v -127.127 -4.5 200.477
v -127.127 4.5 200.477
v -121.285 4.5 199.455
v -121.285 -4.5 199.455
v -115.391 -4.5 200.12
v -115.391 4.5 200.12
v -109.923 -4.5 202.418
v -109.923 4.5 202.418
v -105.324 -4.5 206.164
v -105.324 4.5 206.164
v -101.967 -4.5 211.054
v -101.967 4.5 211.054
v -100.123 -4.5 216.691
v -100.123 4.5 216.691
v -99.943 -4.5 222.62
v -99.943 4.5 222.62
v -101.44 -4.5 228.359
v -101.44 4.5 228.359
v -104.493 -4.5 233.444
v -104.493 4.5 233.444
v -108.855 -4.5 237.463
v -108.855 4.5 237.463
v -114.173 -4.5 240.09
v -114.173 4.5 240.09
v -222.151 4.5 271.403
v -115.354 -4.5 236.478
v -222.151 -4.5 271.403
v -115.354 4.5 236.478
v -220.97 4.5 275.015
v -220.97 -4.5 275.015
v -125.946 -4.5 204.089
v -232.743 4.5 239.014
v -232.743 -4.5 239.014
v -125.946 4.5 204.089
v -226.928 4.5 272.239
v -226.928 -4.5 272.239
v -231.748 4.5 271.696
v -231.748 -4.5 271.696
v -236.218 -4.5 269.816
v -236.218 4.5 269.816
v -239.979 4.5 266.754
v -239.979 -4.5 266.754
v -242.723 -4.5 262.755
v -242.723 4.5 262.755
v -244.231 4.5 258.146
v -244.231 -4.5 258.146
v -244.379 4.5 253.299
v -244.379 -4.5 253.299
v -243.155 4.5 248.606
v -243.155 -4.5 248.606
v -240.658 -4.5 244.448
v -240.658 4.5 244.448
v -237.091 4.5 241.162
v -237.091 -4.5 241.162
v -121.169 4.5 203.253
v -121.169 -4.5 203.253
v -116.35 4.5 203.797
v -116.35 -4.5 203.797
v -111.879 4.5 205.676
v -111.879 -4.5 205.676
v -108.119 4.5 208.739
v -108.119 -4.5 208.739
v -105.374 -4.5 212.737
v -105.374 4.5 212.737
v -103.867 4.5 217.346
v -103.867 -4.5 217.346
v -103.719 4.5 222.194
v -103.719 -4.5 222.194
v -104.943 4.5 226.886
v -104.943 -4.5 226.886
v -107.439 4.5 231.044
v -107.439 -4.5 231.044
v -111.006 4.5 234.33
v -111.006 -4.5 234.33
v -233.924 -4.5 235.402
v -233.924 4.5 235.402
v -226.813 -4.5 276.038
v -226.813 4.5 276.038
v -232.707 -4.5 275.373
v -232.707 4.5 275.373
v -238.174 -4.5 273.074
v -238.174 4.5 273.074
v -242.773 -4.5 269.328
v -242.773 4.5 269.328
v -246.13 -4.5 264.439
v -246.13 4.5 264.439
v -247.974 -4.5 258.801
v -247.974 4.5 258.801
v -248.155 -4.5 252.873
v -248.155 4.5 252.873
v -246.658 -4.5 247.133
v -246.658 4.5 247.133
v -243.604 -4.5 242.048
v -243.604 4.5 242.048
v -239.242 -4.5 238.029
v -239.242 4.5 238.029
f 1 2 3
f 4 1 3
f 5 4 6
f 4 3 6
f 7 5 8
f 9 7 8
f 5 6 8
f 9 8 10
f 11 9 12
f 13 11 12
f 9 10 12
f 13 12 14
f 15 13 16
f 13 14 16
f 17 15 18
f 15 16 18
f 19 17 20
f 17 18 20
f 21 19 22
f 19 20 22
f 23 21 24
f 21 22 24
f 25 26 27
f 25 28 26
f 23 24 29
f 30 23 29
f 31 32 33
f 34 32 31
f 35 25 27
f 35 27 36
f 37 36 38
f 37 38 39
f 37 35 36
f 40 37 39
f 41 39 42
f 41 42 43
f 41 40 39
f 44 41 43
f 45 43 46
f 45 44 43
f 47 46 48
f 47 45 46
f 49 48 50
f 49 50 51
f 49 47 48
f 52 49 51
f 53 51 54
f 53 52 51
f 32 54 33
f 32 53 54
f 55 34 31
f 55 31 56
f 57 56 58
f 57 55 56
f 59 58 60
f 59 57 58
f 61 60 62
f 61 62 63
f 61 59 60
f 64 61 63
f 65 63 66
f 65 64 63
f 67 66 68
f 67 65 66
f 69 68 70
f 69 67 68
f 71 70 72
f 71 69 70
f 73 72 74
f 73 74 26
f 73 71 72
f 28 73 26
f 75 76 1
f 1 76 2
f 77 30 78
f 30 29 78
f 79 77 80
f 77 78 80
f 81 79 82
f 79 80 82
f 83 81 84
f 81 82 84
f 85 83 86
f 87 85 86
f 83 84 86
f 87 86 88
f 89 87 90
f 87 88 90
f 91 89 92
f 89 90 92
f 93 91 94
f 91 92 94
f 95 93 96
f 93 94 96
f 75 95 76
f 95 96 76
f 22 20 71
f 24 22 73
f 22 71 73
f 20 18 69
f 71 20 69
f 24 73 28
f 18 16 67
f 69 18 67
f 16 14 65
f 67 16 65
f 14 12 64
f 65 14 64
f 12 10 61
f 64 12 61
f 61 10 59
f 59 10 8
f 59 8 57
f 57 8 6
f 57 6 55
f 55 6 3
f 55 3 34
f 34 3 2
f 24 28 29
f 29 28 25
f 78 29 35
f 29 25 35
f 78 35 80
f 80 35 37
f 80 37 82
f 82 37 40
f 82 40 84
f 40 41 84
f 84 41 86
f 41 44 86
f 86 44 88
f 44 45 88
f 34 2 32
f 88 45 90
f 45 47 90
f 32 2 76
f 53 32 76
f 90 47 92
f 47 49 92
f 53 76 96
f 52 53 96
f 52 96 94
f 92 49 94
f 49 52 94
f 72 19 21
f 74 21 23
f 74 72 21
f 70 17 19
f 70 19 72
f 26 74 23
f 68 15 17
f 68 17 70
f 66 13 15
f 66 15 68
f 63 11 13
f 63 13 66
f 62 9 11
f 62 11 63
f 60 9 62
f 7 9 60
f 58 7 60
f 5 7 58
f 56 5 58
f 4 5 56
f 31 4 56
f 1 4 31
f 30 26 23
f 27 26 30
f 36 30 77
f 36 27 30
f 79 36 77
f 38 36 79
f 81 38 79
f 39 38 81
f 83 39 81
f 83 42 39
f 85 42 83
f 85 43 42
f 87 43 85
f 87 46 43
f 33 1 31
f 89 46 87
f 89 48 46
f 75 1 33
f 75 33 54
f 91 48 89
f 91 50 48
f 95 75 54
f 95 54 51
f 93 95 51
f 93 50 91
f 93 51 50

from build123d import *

# Parameters (mm, degrees)
CROQUIS42_R                        = 14.2875
CROQUIS42_R_2                      = 2.4892
CROQUIS42_R_3                      = 9.5631
EXTRUDE_4400_23_P_0501_DEPTH       = 6.35
EXTRUDE_4400_23_P_0502_OUTLINE_R   = 14.2875
EXTRUDE_4400_23_P_0502_OUTLINE_R_2 = 2.4892
EXTRUDE_4400_23_P_0502_DEPTH       = 6.35
CROQUIS47_R                        = 2.4892
CORTAR_EXTRUIR1_DEPTH              = 392.719699627
CROQUIS48_W                        = 203.2
CROQUIS48_H                        = 25.4
SALIENTE_EXTRUIR4_DEPTH            = 25.4
VACIADO1_T                         = -3.175
CROQUIS49_W                        = 50.8
CROQUIS49_H                        = 25.4
SALIENTE_EXTRUIR5_DEPTH            = 152.4
VACIADO2_T                         = -3.175
CROQUIS50_R                        = 14.3129
CROQUIS50_R_2                      = 2.4892
CORTAR_EXTRUIR2_DEPTH              = 539.610187059
CROQUIS53_R                        = 2.4892
SALIENTE_EXTRUIR6_DEPTH            = 3.175
CROQUIS55_R                        = 2.4892
CORTAR_EXTRUIR3_DEPTH              = 28.575
CORTAR_EXTRUIR4_DEPTH              = 420.505185398
CORTAR_EXTRUIR4_DEPTH_BACK         = 420.505185398
CROQUIS56_R                        = 3.2639
CROQUIS57_W                        = 50.8762
CROQUIS57_H                        = 25.4762
CORTAR_EXTRUIR5_DEPTH              = 6.35
SALIENTE_EXTRUIR7_DEPTH            = 4.5
SALIENTE_EXTRUIR9_DEPTH            = 4.5


# Read off the part's stored shape, not the designer's step: 4400-23-P-0502
with BuildPart() as part:
    # Croquis42 → 4400-23-P-0501 (new body)
    with BuildSketch(Plane(origin=(0, 184.15, 0), x_dir=(1, 0, 0), z_dir=(0, 1, 0))):
        with BuildLine():
            Line((88.359188985, 137.182253519), (-88.34651861, 137.182253519))
            ThreePointArc((-88.34651861, 137.182253519), (-105.337250829, 130.662799557), (-113.605912458, 114.451152627))
            Line((-113.605912458, 114.451152627), (-139.101589768, -126.848847373))
            ThreePointArc((-139.101589768, -126.848847373), (-140.353519458, -135.509571637), (-142.264354165, -144.049137401))
            ThreePointArc((-142.264354165, -144.049137401), (-151.832193089, -152.899040942), (-164.816388377, -151.769878826))
            ThreePointArc((-164.816388377, -151.769878826), (-169.567285608, -151.859959078), (-171.875550605, -156.013397612))
            ThreePointArc((-171.875550605, -156.013397612), (-178.08501659, -181.1261948), (-195.856181675, -199.925017686))
            ThreePointArc((-195.856181675, -199.925017686), (-196.402455792, -200.320741342), (-196.887342109, -200.789674047))
            Line((-196.887342109, -200.789674047), (-212.697786669, -218.412409382))
            ThreePointArc((-212.697786669, -218.412409382), (-217.730973382, -222.727024179), (-223.709210874, -225.59225468))
            Line((-223.709210874, -225.59225468), (-235.835713977, -229.557877567))
            ThreePointArc((-235.835713977, -229.557877567), (-253.324996625, -262.868518564), (-220.522053125, -281.292435328))
            Line((-220.522053125, -281.292435328), (-112.095188672, -252.504801968))
            ThreePointArc((-112.095188672, -252.504801968), (-87.673300223, -225.175066373), (-103.110565757, -191.933015956))
            ThreePointArc((-103.110565757, -191.933015956), (-118.079867963, -174.552433995), (-120.357522092, -151.727514948))
            Line((-120.357522092, -151.727514948), (-112.383619234, -113.627514948))
            ThreePointArc((-112.383619234, -113.627514948), (-101.768716069, -96.213982816), (-82.55, -89.391356987))
            ThreePointArc((-82.55, -89.391356987), (-62.030318089, -81.335848201), (-52.471032559, -61.472096599))
            Line((-52.471032559, -61.472096599), (-47.621676919, 3.551545851))
            ThreePointArc((-47.621676919, 3.551545851), (0, 47.753927487), (47.621676919, 3.551545851))
            Line((47.621676919, 3.551545851), (52.471032559, -61.472096599))
            ThreePointArc((52.471032559, -61.472096599), (62.030318089, -81.335848201), (82.55, -89.391356987))
            ThreePointArc((82.55, -89.391356987), (101.768716069, -96.213982816), (112.383619234, -113.627514948))
            Line((112.383619234, -113.627514948), (120.357522092, -151.727514948))
            ThreePointArc((120.357522092, -151.727514948), (118.079867963, -174.552433995), (103.110565757, -191.933015956))
            ThreePointArc((103.110565757, -191.933015956), (87.673300223, -225.175066373), (112.095188672, -252.504801968))
            Line((112.095188672, -252.504801968), (220.522053125, -281.292435328))
            ThreePointArc((220.522053125, -281.292435328), (253.324996625, -262.868518564), (235.835713977, -229.557877567))
            Line((235.835713977, -229.557877567), (223.709210874, -225.59225468))
            ThreePointArc((223.709210874, -225.59225468), (217.730973382, -222.727024179), (212.697786669, -218.412409382))
            Line((212.697786669, -218.412409382), (196.887342109, -200.789674047))
            ThreePointArc((196.887342109, -200.789674047), (196.402455792, -200.320741342), (195.856181675, -199.925017686))
            ThreePointArc((195.856181675, -199.925017686), (178.08501659, -181.1261948), (171.875550605, -156.013397612))
            ThreePointArc((171.875550605, -156.013397612), (169.567285608, -151.859959078), (164.816388377, -151.769878826))
            ThreePointArc((164.816388377, -151.769878826), (152.26322842, -153.039859148), (142.647258285, -144.87115097))
            ThreePointArc((142.647258285, -144.87115097), (140.583371058, -135.914425081), (139.245830086, -126.820825503))
            Line((139.245830086, -126.820825503), (113.617107402, 114.465079877))
            ThreePointArc((113.617107402, 114.465079877), (105.344715331, 130.667483058), (88.359188985, 137.182253519))
        make_face()
        with Locations(Location((-227.447376581, -255.208627108, 0), (0, 0, 270))):
            Circle(CROQUIS42_R, mode=Mode.SUBTRACT)
        with Locations(Location((-193.342405236, -203.970055914, 0), (0, 0, 270))):
            Circle(CROQUIS42_R_2, mode=Mode.SUBTRACT)
        with Locations(Location((-120.65, -220.283627108, 0), (0, 0, 270))):
            Circle(CROQUIS42_R, mode=Mode.SUBTRACT)
        with Locations(Location((-167.113590003, -155.941721458, 0), (0, 0, 270))):
            Circle(CROQUIS42_R_2, mode=Mode.SUBTRACT)
        with Locations(Location((120.65, -220.283627108, 0), (0, 0, 270))):
            Circle(CROQUIS42_R, mode=Mode.SUBTRACT)
        with Locations(Location((227.447376581, -255.208627108, 0), (0, 0, 270))):
            Circle(CROQUIS42_R, mode=Mode.SUBTRACT)
        with Locations(Location((167.113590003, -155.941721458, 0), (0, 0, 270))):
            Circle(CROQUIS42_R_2, mode=Mode.SUBTRACT)
        with Locations(Location((-82.55, -59.228856987, 0), (0, 0, 270))):
            Circle(CROQUIS42_R, mode=Mode.SUBTRACT)
        with Locations(Location((-82.55, 29.266072697, 0), (0, 0, 270))):
            Circle(CROQUIS42_R_2, mode=Mode.SUBTRACT)
        with Locations(Location((-107.95, 54.666072697, 0), (0, 0, 270))):
            Circle(CROQUIS42_R_2, mode=Mode.SUBTRACT)
        with Locations(Location((-82.55, 54.666072697, 0), (0, 0, 270))):
            Circle(CROQUIS42_R_3, mode=Mode.SUBTRACT)
        with Locations(Location((-82.55, 80.066072697, 0), (0, 0, 270))):
            Circle(CROQUIS42_R_2, mode=Mode.SUBTRACT)
        with Locations(Location((-57.15, 54.666072697, 0), (0, 0, 270))):
            Circle(CROQUIS42_R_2, mode=Mode.SUBTRACT)
        with Locations(Location((82.55, -59.228856987, 0), (0, 0, 270))):
            Circle(CROQUIS42_R, mode=Mode.SUBTRACT)
        with Locations(Location((82.55, 29.266072697, 0), (0, 0, 270))):
            Circle(CROQUIS42_R_2, mode=Mode.SUBTRACT)
        with Locations(Location((57.15, 54.666072697, 0), (0, 0, 270))):
            Circle(CROQUIS42_R_2, mode=Mode.SUBTRACT)
        with Locations(Location((82.55, 54.666072697, 0), (0, 0, 270))):
            Circle(CROQUIS42_R_3, mode=Mode.SUBTRACT)
        with Locations(Location((107.95, 54.666072697, 0), (0, 0, 270))):
            Circle(CROQUIS42_R_2, mode=Mode.SUBTRACT)
        with Locations(Location((82.55, 80.066072697, 0), (0, 0, 270))):
            Circle(CROQUIS42_R_2, mode=Mode.SUBTRACT)
        with Locations(Location((193.342405236, -203.970055914, 0), (0, 0, 270))):
            Circle(CROQUIS42_R_2, mode=Mode.SUBTRACT)
    extrude(amount=EXTRUDE_4400_23_P_0501_DEPTH)


with BuildPart() as body_2:
    # 4400-23-P-0502 outline → 4400-23-P-0502 (new body)
    with BuildSketch(Plane(origin=(0, 95.25, 0), x_dir=(1, 0, 0), z_dir=(0, 1, 0))):
        with BuildLine():
            Line((-113.605912458, 114.451152627), (-139.101589768, -126.848847373))
            ThreePointArc((-139.101589768, -126.848847373), (-140.353519458, -135.509571637), (-142.264354165, -144.049137401))
            ThreePointArc((-142.264354165, -144.049137401), (-151.832193089, -152.899040942), (-164.816388377, -151.769878826))
            ThreePointArc((-164.816388377, -151.769878826), (-169.567285608, -151.859959078), (-171.875550605, -156.013397612))
            ThreePointArc((-171.875550605, -156.013397612), (-178.08501659, -181.1261948), (-195.856181675, -199.925017686))
            Line((-195.856181675, -199.925017686), (-212.697786669, -218.412409382))
            ThreePointArc((-212.697786669, -218.412409382), (-217.730973382, -222.727024179), (-223.709210874, -225.59225468))
            Line((-223.709210874, -225.59225468), (-235.835713977, -229.557877567))
            ThreePointArc((-235.835713977, -229.557877567), (-253.324996625, -262.868518564), (-220.522053125, -281.292435328))
            Line((-220.522053125, -281.292435328), (-112.095188672, -252.504801968))
            ThreePointArc((-112.095188672, -252.504801968), (-87.673300223, -225.175066373), (-103.110565757, -191.933015956))
            ThreePointArc((-103.110565757, -191.933015956), (-118.079867963, -174.552433995), (-120.357522092, -151.727514948))
            Line((-120.357522092, -151.727514948), (-112.383619234, -113.627514948))
            ThreePointArc((-112.383619234, -113.627514948), (-100.293200153, -90.736166152), (-77.899975527, -77.74634036))
            ThreePointArc((-77.899975527, -77.74634036), (-67.495099348, -70.970657719), (-63.457595278, -59.228856987))
            Line((-63.457595278, -59.228856987), (-63.457595278, 0))
            ThreePointArc((-63.457595278, 0), (0, 63.457595278), (63.457595278, 0))
            Line((63.457595278, 0), (63.457595278, -59.228856987))
            ThreePointArc((63.457595278, -59.228856987), (67.495099348, -70.970657719), (77.899975527, -77.74634036))
            ThreePointArc((77.899975527, -77.74634036), (100.293200153, -90.736166152), (112.383619234, -113.627514948))
            Line((112.383619234, -113.627514948), (120.357522092, -151.727514948))
            ThreePointArc((120.357522092, -151.727514948), (118.079867963, -174.552433995), (103.110565757, -191.933015956))
            ThreePointArc((103.110565757, -191.933015956), (87.673300223, -225.175066373), (112.095188672, -252.504801968))
            Line((112.095188672, -252.504801968), (220.522053125, -281.292435328))
            ThreePointArc((220.522053125, -281.292435328), (253.324996625, -262.868518564), (235.835713977, -229.557877567))
            Line((235.835713977, -229.557877567), (223.709210874, -225.59225468))
            ThreePointArc((223.709210874, -225.59225468), (217.730973382, -222.727024179), (212.697786669, -218.412409382))
            Line((212.697786669, -218.412409382), (195.856181675, -199.925017686))
            ThreePointArc((195.856181675, -199.925017686), (178.08501659, -181.1261948), (171.875550605, -156.013397612))
            ThreePointArc((171.875550605, -156.013397612), (169.567285608, -151.859959078), (164.816388377, -151.769878826))
            ThreePointArc((164.816388377, -151.769878826), (151.832193089, -152.899040942), (142.264354165, -144.049137401))
            ThreePointArc((142.264354165, -144.049137401), (140.353519458, -135.509571637), (139.101589768, -126.848847373))
            Line((139.101589768, -126.848847373), (113.605912458, 114.451152627))
            ThreePointArc((113.605912458, 114.451152627), (105.341959426, 130.658561195), (88.359188984, 137.182250359))
            Line((88.359188984, 137.182250359), (-88.34651861, 137.182253519))
            ThreePointArc((-88.34651861, 137.182253519), (-105.337250829, 130.662799557), (-113.605912458, 114.451152627))
        make_face()
        with Locations((-227.447376581, -255.208627108)):
            Circle(EXTRUDE_4400_23_P_0502_OUTLINE_R, mode=Mode.SUBTRACT)
        with Locations((-193.342405236, -203.970055914)):
            Circle(EXTRUDE_4400_23_P_0502_OUTLINE_R_2, mode=Mode.SUBTRACT)
        with Locations((-120.65, -220.283627108)):
            Circle(EXTRUDE_4400_23_P_0502_OUTLINE_R, mode=Mode.SUBTRACT)
        with Locations((-167.113590003, -155.941721458)):
            Circle(EXTRUDE_4400_23_P_0502_OUTLINE_R_2, mode=Mode.SUBTRACT)
        with Locations((120.65, -220.283627108)):
            Circle(EXTRUDE_4400_23_P_0502_OUTLINE_R, mode=Mode.SUBTRACT)
        with Locations((227.447376581, -255.208627108)):
            Circle(EXTRUDE_4400_23_P_0502_OUTLINE_R, mode=Mode.SUBTRACT)
        with Locations((193.342405236, -203.970055914)):
            Circle(EXTRUDE_4400_23_P_0502_OUTLINE_R_2, mode=Mode.SUBTRACT)
        with Locations((167.113590003, -155.941721458)):
            Circle(EXTRUDE_4400_23_P_0502_OUTLINE_R_2, mode=Mode.SUBTRACT)
        with Locations((-82.55, -59.228856987)):
            Circle(EXTRUDE_4400_23_P_0502_OUTLINE_R, mode=Mode.SUBTRACT)
        with Locations((82.55, -59.228856987)):
            Circle(EXTRUDE_4400_23_P_0502_OUTLINE_R, mode=Mode.SUBTRACT)
    extrude(amount=EXTRUDE_4400_23_P_0502_DEPTH)


with BuildPart() as cortar_extruir1_tool:
    # Croquis47 → Cortar-Extruir1 (new, through all)
    with BuildSketch(Plane(origin=(0, 190.5, 0), x_dir=(1, 0, 0), z_dir=(0, 1, 0))):
        with Locations(Location((-131.508664667, -129.403842106, 0), (0, 0, 270))):
            Circle(CROQUIS47_R)
        with Locations(Location((-191.907087884, -241.47917412, 0), (0, 0, 270))):
            Circle(CROQUIS47_R)
        with Locations(Location((131.508664667, -129.403842106, 0), (0, 0, 270))):
            Circle(CROQUIS47_R)
        with Locations(Location((-117.606595202, -5.496427303, 0), (0, 0, 270))):
            Circle(CROQUIS47_R)
        with Locations(Location((-116.361466228, 16.971143013, 0), (0, 0, 270))):
            Circle(CROQUIS47_R)
        with Locations(Location((116.361466228, 16.971143013, 0), (0, 0, 270))):
            Circle(CROQUIS47_R)
        with Locations(Location((117.606595202, -5.496427303, 0), (0, 0, 270))):
            Circle(CROQUIS47_R)
        with Locations(Location((38.8975, 62.847528811, 0), (0, 0, 270))):
            Circle(CROQUIS47_R)
        with Locations(Location((4.820590175, 80.776381017, 0), (0, 0, 270))):
            Circle(CROQUIS47_R)
        with Locations(Location((-37.776259667, 66.128159842, 0), (0, 0, 270))):
            Circle(CROQUIS47_R)
        with Locations(Location((-84.246357442, 7.676072697, 0), (0, 0, 270))):
            Circle(CROQUIS47_R)
        with Locations(Location((191.907087884, -241.47917412, 0), (0, 0, 270))):
            Circle(CROQUIS47_R)
        with Locations(Location((84.246357442, 7.676072697, 0), (0, 0, 270))):
            Circle(CROQUIS47_R)
    extrude(amount=-CORTAR_EXTRUIR1_DEPTH)


with BuildPart() as part_1:
    add(part.part)

    # Cortar-Extruir1: cut by cortar_extruir1_tool
    add(cortar_extruir1_tool.part, mode=Mode.SUBTRACT)


with BuildPart() as body_2_1:
    add(body_2.part)

    # Cortar-Extruir1: cut by cortar_extruir1_tool
    add(cortar_extruir1_tool.part, mode=Mode.SUBTRACT)


with BuildPart() as body_3:
    # Croquis48 → Saliente-Extruir4 (new body)
    with BuildSketch(Plane(origin=(0, 101.6, 0), x_dir=(1, 0, 0), z_dir=(0, 1, 0))):
        with Locations((0, 114.3)):
            Rectangle(CROQUIS48_W, CROQUIS48_H)
    extrude(amount=SALIENTE_EXTRUIR4_DEPTH)

    # Vaciado1
    vaciado1_openings = [body_3.faces().sort_by_distance(p)[0] for p in [
        (-101.6, 114.3, -114.3),
        (101.6, 114.3, -114.3),
    ]]
    offset(amount=VACIADO1_T, openings=vaciado1_openings, kind=Kind.INTERSECTION)


with BuildPart() as body_4:
    # Croquis49 → Saliente-Extruir5 (new body)
    with BuildSketch(Plane(origin=(0, 127, 0), x_dir=(1, 0, 0), z_dir=(0, 1, 0))):
        with Locations((0, 114.3)):
            Rectangle(CROQUIS49_W, CROQUIS49_H)
    extrude(amount=SALIENTE_EXTRUIR5_DEPTH)

    # Vaciado2
    vaciado2_openings = [body_4.faces().sort_by_distance(p)[0] for p in [
        (0, 279.4, -114.3),
        (0, 127, -114.3),
    ]]
    offset(amount=VACIADO2_T, openings=vaciado2_openings, kind=Kind.INTERSECTION)

    # Croquis50 → Cortar-Extruir2 (cut, through all)
    with BuildSketch(Plane.XY.offset(-101.6)):
        with Locations((0, 241.2619)):
            Circle(CROQUIS50_R)
        with Locations((11.90625, 261.884129928)):
            Circle(CROQUIS50_R_2)
        with Locations((11.90625, 220.639670072)):
            Circle(CROQUIS50_R_2)
        with Locations((-11.90625, 220.639670072)):
            Circle(CROQUIS50_R_2)
        with Locations((-11.90625, 261.884129928)):
            Circle(CROQUIS50_R_2)
    extrude(amount=-CORTAR_EXTRUIR2_DEPTH, mode=Mode.SUBTRACT)


with BuildPart() as body_5:
    # Croquis53 → Saliente-Extruir6 (new body)
    with BuildSketch(Plane.XY.offset(-101.6)):
        with BuildLine():
            Line((50.8, 101.6), (-50.8, 101.6))
            ThreePointArc((-50.8, 101.6), (-55.290128061, 103.459871939), (-57.15, 107.95))
            Line((-57.15, 107.95), (-57.15, 125.348133557))
            ThreePointArc((-57.15, 125.348133557), (-56.945468654, 126.946793942), (-56.345050385, 128.44246971))
            Line((-56.345050385, 128.44246971), (-27.216776701, 180.640336153))
            ThreePointArc((-27.216776701, 180.640336153), (-24.886805275, 183.021926158), (-21.671726315, 183.896))
            Line((-21.671726315, 183.896), (21.671726315, 183.896))
            ThreePointArc((21.671726315, 183.896), (24.886805275, 183.021926158), (27.216776701, 180.640336153))
            Line((27.216776701, 180.640336153), (56.345050385, 128.44246971))
            ThreePointArc((56.345050385, 128.44246971), (56.945468654, 126.946793942), (57.15, 125.348133557))
            Line((57.15, 125.348133557), (57.15, 107.95))
            ThreePointArc((57.15, 107.95), (55.290128061, 103.459871939), (50.8, 101.6))
        make_face()
        with Locations((0, 114.3)):
            Circle(CROQUIS53_R, mode=Mode.SUBTRACT)
        with Locations((12.7, 114.3)):
            Circle(CROQUIS53_R, mode=Mode.SUBTRACT)
        with Locations((25.4, 114.3)):
            Circle(CROQUIS53_R, mode=Mode.SUBTRACT)
        with Locations((38.1, 114.3)):
            Circle(CROQUIS53_R, mode=Mode.SUBTRACT)
        with Locations((50.8, 114.3)):
            Circle(CROQUIS53_R, mode=Mode.SUBTRACT)
        with Locations(Location((-50.8, 114.3, 0), (0, 0, 180))):
            Circle(CROQUIS53_R, mode=Mode.SUBTRACT)
        with Locations(Location((-38.1, 114.3, 0), (0, 0, 180))):
            Circle(CROQUIS53_R, mode=Mode.SUBTRACT)
        with Locations(Location((-25.4, 114.3, 0), (0, 0, 180))):
            Circle(CROQUIS53_R, mode=Mode.SUBTRACT)
        with Locations(Location((-12.7, 114.3, 0), (0, 0, 180))):
            Circle(CROQUIS53_R, mode=Mode.SUBTRACT)
        with Locations(Location((-12.7, 139.7, 0), (0, 0, 180))):
            Circle(CROQUIS53_R, mode=Mode.SUBTRACT)
        with Locations((12.7, 139.7)):
            Circle(CROQUIS53_R, mode=Mode.SUBTRACT)
        with Locations(Location((-12.7, 152.4, 0), (0, 0, 180))):
            Circle(CROQUIS53_R, mode=Mode.SUBTRACT)
        with Locations((12.7, 152.4)):
            Circle(CROQUIS53_R, mode=Mode.SUBTRACT)
        with Locations(Location((-12.7, 165.1, 0), (0, 0, 180))):
            Circle(CROQUIS53_R, mode=Mode.SUBTRACT)
        with Locations((12.7, 165.1)):
            Circle(CROQUIS53_R, mode=Mode.SUBTRACT)
        with Locations(Location((-12.7, 177.8, 0), (0, 0, 180))):
            Circle(CROQUIS53_R, mode=Mode.SUBTRACT)
        with Locations((12.7, 177.8)):
            Circle(CROQUIS53_R, mode=Mode.SUBTRACT)
    extrude(amount=SALIENTE_EXTRUIR6_DEPTH)


with BuildPart() as cortar_extruir3_tool:
    # Croquis55 → Cortar-Extruir3 (new body)
    with BuildSketch(Plane.XY.offset(-98.425)):
        with Locations(Location((-12.7, 114.3, 0), (0, 0, 180))):
            Circle(CROQUIS55_R)
        with Locations(Location((-12.7, 139.7, 0), (0, 0, 180))):
            Circle(CROQUIS55_R)
        with Locations(Location((-25.4, 114.3, 0), (0, 0, 180))):
            Circle(CROQUIS55_R)
        with Locations(Location((-38.1, 114.3, 0), (0, 0, 180))):
            Circle(CROQUIS55_R)
        with Locations(Location((-50.8, 114.3, 0), (0, 0, 180))):
            Circle(CROQUIS55_R)
        with Locations(Location((-12.7, 165.1, 0), (0, 0, 180))):
            Circle(CROQUIS55_R)
        with Locations(Location((-12.7, 152.4, 0), (0, 0, 180))):
            Circle(CROQUIS55_R)
        with Locations(Location((-12.7, 177.8, 0), (0, 0, 180))):
            Circle(CROQUIS55_R)
        with Locations((12.7, 165.1)):
            Circle(CROQUIS55_R)
        with Locations((12.7, 177.8)):
            Circle(CROQUIS55_R)
        with Locations((0, 114.3)):
            Circle(CROQUIS55_R)
        with Locations((12.7, 114.3)):
            Circle(CROQUIS55_R)
        with Locations((12.7, 139.7)):
            Circle(CROQUIS55_R)
        with Locations((12.7, 152.4)):
            Circle(CROQUIS55_R)
        with Locations((50.8, 114.3)):
            Circle(CROQUIS55_R)
        with Locations((38.1, 114.3)):
            Circle(CROQUIS55_R)
        with Locations((25.4, 114.3)):
            Circle(CROQUIS55_R)
    extrude(amount=-CORTAR_EXTRUIR3_DEPTH)


with BuildPart() as body_3_1:
    add(body_3.part)

    # Cortar-Extruir3: cut by cortar_extruir3_tool
    add(cortar_extruir3_tool.part, mode=Mode.SUBTRACT)


with BuildPart() as body_4_1:
    add(body_4.part)

    # Cortar-Extruir3: cut by cortar_extruir3_tool
    add(cortar_extruir3_tool.part, mode=Mode.SUBTRACT)


with BuildPart() as cortar_extruir4_tool:
    # Croquis56 → Cortar-Extruir4 (new, two sides: drawn at the far end of the back side and taken through both)
    with BuildSketch(Plane.XZ.offset(-101.6).offset(-CORTAR_EXTRUIR4_DEPTH_BACK)):
        with Locations(Location((-47.625, -114.3, 0), (0, 0, 90))):
            Circle(CROQUIS56_R)
        with Locations(Location((-79.375, -114.3, 0), (0, 0, 90))):
            Circle(CROQUIS56_R)
        with Locations(Location((79.375, -114.3, 0), (0, 0, 90))):
            Circle(CROQUIS56_R)
        with Locations(Location((47.625, -114.3, 0), (0, 0, 90))):
            Circle(CROQUIS56_R)
    extrude(amount=CORTAR_EXTRUIR4_DEPTH + CORTAR_EXTRUIR4_DEPTH_BACK)


with BuildPart() as part_2:
    add(part_1.part)

    # Cortar-Extruir4: cut by cortar_extruir4_tool
    add(cortar_extruir4_tool.part, mode=Mode.SUBTRACT)

    # Croquis57 → Cortar-Extruir5 (cut)
    with BuildSketch(Plane(origin=(0, 190.5, 0), x_dir=(1, 0, 0), z_dir=(0, 1, 0))):
        with Locations((0, 114.3)):
            Rectangle(CROQUIS57_W, CROQUIS57_H)
    extrude(amount=-CORTAR_EXTRUIR5_DEPTH, mode=Mode.SUBTRACT)


with BuildPart() as body_2_2:
    add(body_2_1.part)

    # Cortar-Extruir4: cut by cortar_extruir4_tool
    add(cortar_extruir4_tool.part, mode=Mode.SUBTRACT)


with BuildPart() as body_3_2:
    add(body_3_1.part)

    # Cortar-Extruir4: cut by cortar_extruir4_tool
    add(cortar_extruir4_tool.part, mode=Mode.SUBTRACT)


with BuildPart() as body_2_2_1:
    # Croquis11 → Saliente-Extruir7 (new, symmetric)
    with BuildSketch(Plane(origin=(0, 184.15, 0), x_dir=(1, 0, 0), z_dir=(0, 1, 0))):
        with BuildLine():
            Line((-109.07688548, -54.716778872), (-101.851570328, -12.238545402))
            ThreePointArc((-101.851570328, -12.238545402), (-103.966471358, -13.163959782), (-106.037145911, -14.184501326))
            Line((-106.037145911, -14.184501326), (-112.823079171, -54.079571818))
            ThreePointArc((-112.823079171, -54.079571818), (-112.569902429, -65.692595716), (-108.021298601, -76.380749238))
            Line((-108.021298601, -76.380749238), (-106.74780526, -70.997489991))
            ThreePointArc((-106.74780526, -70.997489991), (-109.186703086, -63.039441048), (-109.07688548, -54.716778872))
        make_face()
        with BuildLine():
            Line((-101.851570328, -12.238545402), (-95.105873566, 27.419971343))
            ThreePointArc((-95.105873566, 27.419971343), (-96.901921658, 28.321768859), (-98.633561075, 29.34179456))
            Line((-98.633561075, 29.34179456), (-106.037145911, -14.184501326))
            ThreePointArc((-106.037145911, -14.184501326), (-103.966471358, -13.163959782), (-101.851570328, -12.238545402))
        make_face()
        with BuildLine():
            ThreePointArc((-66.466438925, 29.34179456), (-68.198078342, 28.321768859), (-69.994126434, 27.419971343))
            Line((-69.994126434, 27.419971343), (-63.248429672, -12.238545402))
            ThreePointArc((-63.248429672, -12.238545402), (-61.133528642, -13.163959782), (-59.062854089, -14.184501326))
            Line((-59.062854089, -14.184501326), (-66.466438925, 29.34179456))
        make_face()
        with BuildLine():
            ThreePointArc((-59.062854089, -14.184501326), (-61.133528642, -13.163959782), (-63.248429672, -12.238545402))
            Line((-63.248429672, -12.238545402), (-56.02311452, -54.716778872))
            ThreePointArc((-56.02311452, -54.716778872), (-57.505982376, -69.069166098), (-66.190042872, -80.59205677))
            Line((-66.190042872, -80.59205677), (-67.463536214, -85.975316017))
            ThreePointArc((-67.463536214, -85.975316017), (-54.824440333, -72.429910028), (-52.276920829, -54.079571818))
            Line((-52.276920829, -54.079571818), (-59.062854089, -14.184501326))
        make_face()
        with BuildLine():
            Line((-95.105873566, 27.419971343), (-90.248720244, 55.975582898))
            ThreePointArc((-90.248720244, 55.975582898), (-82.55, 62.475369103), (-74.851279756, 55.975582898))
            Line((-74.851279756, 55.975582898), (-69.994126434, 27.419971343))
            ThreePointArc((-69.994126434, 27.419971343), (-68.198078342, 28.321768859), (-66.466438925, 29.34179456))
            Line((-66.466438925, 29.34179456), (-71.105086065, 56.612789952))
            ThreePointArc((-71.105086065, 56.612789952), (-82.55, 66.275369103), (-93.994913935, 56.612789952))
            Line((-93.994913935, 56.612789952), (-98.633561075, 29.34179456))
            ThreePointArc((-98.633561075, 29.34179456), (-96.901921658, 28.321768859), (-95.105873566, 27.419971343))
        make_face()
        with BuildLine():
            ThreePointArc((-70.763429712, -83.417930202), (-88.744505126, -85.414017067), (-103.925323363, -75.572970707))
            Line((-103.925323363, -75.572970707), (-105.012211918, -80.16742179))
            ThreePointArc((-105.012211918, -80.16742179), (-89.619308767, -89.111951435), (-71.850318266, -88.012381285))
            Line((-71.850318266, -88.012381285), (-70.763429712, -83.417930202))
        make_face()
        with BuildLine():
            ThreePointArc((-103.925323363, -75.572970707), (-105.451119385, -73.355896065), (-106.74780526, -70.997489991))
            Line((-106.74780526, -70.997489991), (-108.021298601, -76.380749238))
            ThreePointArc((-108.021298601, -76.380749238), (-106.591424249, -78.333421371), (-105.012211918, -80.16742179))
            Line((-105.012211918, -80.16742179), (-103.925323363, -75.572970707))
        make_face()
        with BuildLine():
            Line((-67.463536214, -85.975316017), (-66.190042872, -80.59205677))
            ThreePointArc((-66.190042872, -80.59205677), (-68.405985663, -82.119496135), (-70.763429712, -83.417930202))
            Line((-70.763429712, -83.417930202), (-71.850318266, -88.012381285))
            ThreePointArc((-71.850318266, -88.012381285), (-69.616758568, -87.080351135), (-67.463536214, -85.975316017))
        make_face()
    extrude(amount=SALIENTE_EXTRUIR7_DEPTH, both=True)


with BuildPart() as body_2_3:
    # Croquis61 → Saliente-Extruir9 (new, symmetric)
    with BuildSketch(Plane(origin=(0, 0, 0), x_dir=(1, 0, 0), z_dir=(0, 1, 0))):
        with BuildLine():
            Line((-114.172884767, -240.090038409), (-220.970261348, -275.015038409))
            ThreePointArc((-220.970261348, -275.015038409), (-247.253787883, -261.685742341), (-233.924491814, -235.402215806))
            Line((-233.924491814, -235.402215806), (-127.127115233, -200.477215806))
            ThreePointArc((-127.127115233, -200.477215806), (-100.843588699, -213.806511874), (-114.172884767, -240.090038409))
        make_face()
        with BuildLine():
            Line((-115.354012404, -236.478260799), (-222.151388985, -271.403260799))
            ThreePointArc((-222.151388985, -271.403260799), (-243.642010273, -260.504614704), (-232.743364177, -239.013993416))
            Line((-232.743364177, -239.013993416), (-125.945987596, -204.088993416))
            ThreePointArc((-125.945987596, -204.088993416), (-104.455366309, -214.987639511), (-115.354012404, -236.478260799))
        make_face(mode=Mode.SUBTRACT)
    extrude(amount=SALIENTE_EXTRUIR9_DEPTH, both=True)


solid = body_2_3.part
